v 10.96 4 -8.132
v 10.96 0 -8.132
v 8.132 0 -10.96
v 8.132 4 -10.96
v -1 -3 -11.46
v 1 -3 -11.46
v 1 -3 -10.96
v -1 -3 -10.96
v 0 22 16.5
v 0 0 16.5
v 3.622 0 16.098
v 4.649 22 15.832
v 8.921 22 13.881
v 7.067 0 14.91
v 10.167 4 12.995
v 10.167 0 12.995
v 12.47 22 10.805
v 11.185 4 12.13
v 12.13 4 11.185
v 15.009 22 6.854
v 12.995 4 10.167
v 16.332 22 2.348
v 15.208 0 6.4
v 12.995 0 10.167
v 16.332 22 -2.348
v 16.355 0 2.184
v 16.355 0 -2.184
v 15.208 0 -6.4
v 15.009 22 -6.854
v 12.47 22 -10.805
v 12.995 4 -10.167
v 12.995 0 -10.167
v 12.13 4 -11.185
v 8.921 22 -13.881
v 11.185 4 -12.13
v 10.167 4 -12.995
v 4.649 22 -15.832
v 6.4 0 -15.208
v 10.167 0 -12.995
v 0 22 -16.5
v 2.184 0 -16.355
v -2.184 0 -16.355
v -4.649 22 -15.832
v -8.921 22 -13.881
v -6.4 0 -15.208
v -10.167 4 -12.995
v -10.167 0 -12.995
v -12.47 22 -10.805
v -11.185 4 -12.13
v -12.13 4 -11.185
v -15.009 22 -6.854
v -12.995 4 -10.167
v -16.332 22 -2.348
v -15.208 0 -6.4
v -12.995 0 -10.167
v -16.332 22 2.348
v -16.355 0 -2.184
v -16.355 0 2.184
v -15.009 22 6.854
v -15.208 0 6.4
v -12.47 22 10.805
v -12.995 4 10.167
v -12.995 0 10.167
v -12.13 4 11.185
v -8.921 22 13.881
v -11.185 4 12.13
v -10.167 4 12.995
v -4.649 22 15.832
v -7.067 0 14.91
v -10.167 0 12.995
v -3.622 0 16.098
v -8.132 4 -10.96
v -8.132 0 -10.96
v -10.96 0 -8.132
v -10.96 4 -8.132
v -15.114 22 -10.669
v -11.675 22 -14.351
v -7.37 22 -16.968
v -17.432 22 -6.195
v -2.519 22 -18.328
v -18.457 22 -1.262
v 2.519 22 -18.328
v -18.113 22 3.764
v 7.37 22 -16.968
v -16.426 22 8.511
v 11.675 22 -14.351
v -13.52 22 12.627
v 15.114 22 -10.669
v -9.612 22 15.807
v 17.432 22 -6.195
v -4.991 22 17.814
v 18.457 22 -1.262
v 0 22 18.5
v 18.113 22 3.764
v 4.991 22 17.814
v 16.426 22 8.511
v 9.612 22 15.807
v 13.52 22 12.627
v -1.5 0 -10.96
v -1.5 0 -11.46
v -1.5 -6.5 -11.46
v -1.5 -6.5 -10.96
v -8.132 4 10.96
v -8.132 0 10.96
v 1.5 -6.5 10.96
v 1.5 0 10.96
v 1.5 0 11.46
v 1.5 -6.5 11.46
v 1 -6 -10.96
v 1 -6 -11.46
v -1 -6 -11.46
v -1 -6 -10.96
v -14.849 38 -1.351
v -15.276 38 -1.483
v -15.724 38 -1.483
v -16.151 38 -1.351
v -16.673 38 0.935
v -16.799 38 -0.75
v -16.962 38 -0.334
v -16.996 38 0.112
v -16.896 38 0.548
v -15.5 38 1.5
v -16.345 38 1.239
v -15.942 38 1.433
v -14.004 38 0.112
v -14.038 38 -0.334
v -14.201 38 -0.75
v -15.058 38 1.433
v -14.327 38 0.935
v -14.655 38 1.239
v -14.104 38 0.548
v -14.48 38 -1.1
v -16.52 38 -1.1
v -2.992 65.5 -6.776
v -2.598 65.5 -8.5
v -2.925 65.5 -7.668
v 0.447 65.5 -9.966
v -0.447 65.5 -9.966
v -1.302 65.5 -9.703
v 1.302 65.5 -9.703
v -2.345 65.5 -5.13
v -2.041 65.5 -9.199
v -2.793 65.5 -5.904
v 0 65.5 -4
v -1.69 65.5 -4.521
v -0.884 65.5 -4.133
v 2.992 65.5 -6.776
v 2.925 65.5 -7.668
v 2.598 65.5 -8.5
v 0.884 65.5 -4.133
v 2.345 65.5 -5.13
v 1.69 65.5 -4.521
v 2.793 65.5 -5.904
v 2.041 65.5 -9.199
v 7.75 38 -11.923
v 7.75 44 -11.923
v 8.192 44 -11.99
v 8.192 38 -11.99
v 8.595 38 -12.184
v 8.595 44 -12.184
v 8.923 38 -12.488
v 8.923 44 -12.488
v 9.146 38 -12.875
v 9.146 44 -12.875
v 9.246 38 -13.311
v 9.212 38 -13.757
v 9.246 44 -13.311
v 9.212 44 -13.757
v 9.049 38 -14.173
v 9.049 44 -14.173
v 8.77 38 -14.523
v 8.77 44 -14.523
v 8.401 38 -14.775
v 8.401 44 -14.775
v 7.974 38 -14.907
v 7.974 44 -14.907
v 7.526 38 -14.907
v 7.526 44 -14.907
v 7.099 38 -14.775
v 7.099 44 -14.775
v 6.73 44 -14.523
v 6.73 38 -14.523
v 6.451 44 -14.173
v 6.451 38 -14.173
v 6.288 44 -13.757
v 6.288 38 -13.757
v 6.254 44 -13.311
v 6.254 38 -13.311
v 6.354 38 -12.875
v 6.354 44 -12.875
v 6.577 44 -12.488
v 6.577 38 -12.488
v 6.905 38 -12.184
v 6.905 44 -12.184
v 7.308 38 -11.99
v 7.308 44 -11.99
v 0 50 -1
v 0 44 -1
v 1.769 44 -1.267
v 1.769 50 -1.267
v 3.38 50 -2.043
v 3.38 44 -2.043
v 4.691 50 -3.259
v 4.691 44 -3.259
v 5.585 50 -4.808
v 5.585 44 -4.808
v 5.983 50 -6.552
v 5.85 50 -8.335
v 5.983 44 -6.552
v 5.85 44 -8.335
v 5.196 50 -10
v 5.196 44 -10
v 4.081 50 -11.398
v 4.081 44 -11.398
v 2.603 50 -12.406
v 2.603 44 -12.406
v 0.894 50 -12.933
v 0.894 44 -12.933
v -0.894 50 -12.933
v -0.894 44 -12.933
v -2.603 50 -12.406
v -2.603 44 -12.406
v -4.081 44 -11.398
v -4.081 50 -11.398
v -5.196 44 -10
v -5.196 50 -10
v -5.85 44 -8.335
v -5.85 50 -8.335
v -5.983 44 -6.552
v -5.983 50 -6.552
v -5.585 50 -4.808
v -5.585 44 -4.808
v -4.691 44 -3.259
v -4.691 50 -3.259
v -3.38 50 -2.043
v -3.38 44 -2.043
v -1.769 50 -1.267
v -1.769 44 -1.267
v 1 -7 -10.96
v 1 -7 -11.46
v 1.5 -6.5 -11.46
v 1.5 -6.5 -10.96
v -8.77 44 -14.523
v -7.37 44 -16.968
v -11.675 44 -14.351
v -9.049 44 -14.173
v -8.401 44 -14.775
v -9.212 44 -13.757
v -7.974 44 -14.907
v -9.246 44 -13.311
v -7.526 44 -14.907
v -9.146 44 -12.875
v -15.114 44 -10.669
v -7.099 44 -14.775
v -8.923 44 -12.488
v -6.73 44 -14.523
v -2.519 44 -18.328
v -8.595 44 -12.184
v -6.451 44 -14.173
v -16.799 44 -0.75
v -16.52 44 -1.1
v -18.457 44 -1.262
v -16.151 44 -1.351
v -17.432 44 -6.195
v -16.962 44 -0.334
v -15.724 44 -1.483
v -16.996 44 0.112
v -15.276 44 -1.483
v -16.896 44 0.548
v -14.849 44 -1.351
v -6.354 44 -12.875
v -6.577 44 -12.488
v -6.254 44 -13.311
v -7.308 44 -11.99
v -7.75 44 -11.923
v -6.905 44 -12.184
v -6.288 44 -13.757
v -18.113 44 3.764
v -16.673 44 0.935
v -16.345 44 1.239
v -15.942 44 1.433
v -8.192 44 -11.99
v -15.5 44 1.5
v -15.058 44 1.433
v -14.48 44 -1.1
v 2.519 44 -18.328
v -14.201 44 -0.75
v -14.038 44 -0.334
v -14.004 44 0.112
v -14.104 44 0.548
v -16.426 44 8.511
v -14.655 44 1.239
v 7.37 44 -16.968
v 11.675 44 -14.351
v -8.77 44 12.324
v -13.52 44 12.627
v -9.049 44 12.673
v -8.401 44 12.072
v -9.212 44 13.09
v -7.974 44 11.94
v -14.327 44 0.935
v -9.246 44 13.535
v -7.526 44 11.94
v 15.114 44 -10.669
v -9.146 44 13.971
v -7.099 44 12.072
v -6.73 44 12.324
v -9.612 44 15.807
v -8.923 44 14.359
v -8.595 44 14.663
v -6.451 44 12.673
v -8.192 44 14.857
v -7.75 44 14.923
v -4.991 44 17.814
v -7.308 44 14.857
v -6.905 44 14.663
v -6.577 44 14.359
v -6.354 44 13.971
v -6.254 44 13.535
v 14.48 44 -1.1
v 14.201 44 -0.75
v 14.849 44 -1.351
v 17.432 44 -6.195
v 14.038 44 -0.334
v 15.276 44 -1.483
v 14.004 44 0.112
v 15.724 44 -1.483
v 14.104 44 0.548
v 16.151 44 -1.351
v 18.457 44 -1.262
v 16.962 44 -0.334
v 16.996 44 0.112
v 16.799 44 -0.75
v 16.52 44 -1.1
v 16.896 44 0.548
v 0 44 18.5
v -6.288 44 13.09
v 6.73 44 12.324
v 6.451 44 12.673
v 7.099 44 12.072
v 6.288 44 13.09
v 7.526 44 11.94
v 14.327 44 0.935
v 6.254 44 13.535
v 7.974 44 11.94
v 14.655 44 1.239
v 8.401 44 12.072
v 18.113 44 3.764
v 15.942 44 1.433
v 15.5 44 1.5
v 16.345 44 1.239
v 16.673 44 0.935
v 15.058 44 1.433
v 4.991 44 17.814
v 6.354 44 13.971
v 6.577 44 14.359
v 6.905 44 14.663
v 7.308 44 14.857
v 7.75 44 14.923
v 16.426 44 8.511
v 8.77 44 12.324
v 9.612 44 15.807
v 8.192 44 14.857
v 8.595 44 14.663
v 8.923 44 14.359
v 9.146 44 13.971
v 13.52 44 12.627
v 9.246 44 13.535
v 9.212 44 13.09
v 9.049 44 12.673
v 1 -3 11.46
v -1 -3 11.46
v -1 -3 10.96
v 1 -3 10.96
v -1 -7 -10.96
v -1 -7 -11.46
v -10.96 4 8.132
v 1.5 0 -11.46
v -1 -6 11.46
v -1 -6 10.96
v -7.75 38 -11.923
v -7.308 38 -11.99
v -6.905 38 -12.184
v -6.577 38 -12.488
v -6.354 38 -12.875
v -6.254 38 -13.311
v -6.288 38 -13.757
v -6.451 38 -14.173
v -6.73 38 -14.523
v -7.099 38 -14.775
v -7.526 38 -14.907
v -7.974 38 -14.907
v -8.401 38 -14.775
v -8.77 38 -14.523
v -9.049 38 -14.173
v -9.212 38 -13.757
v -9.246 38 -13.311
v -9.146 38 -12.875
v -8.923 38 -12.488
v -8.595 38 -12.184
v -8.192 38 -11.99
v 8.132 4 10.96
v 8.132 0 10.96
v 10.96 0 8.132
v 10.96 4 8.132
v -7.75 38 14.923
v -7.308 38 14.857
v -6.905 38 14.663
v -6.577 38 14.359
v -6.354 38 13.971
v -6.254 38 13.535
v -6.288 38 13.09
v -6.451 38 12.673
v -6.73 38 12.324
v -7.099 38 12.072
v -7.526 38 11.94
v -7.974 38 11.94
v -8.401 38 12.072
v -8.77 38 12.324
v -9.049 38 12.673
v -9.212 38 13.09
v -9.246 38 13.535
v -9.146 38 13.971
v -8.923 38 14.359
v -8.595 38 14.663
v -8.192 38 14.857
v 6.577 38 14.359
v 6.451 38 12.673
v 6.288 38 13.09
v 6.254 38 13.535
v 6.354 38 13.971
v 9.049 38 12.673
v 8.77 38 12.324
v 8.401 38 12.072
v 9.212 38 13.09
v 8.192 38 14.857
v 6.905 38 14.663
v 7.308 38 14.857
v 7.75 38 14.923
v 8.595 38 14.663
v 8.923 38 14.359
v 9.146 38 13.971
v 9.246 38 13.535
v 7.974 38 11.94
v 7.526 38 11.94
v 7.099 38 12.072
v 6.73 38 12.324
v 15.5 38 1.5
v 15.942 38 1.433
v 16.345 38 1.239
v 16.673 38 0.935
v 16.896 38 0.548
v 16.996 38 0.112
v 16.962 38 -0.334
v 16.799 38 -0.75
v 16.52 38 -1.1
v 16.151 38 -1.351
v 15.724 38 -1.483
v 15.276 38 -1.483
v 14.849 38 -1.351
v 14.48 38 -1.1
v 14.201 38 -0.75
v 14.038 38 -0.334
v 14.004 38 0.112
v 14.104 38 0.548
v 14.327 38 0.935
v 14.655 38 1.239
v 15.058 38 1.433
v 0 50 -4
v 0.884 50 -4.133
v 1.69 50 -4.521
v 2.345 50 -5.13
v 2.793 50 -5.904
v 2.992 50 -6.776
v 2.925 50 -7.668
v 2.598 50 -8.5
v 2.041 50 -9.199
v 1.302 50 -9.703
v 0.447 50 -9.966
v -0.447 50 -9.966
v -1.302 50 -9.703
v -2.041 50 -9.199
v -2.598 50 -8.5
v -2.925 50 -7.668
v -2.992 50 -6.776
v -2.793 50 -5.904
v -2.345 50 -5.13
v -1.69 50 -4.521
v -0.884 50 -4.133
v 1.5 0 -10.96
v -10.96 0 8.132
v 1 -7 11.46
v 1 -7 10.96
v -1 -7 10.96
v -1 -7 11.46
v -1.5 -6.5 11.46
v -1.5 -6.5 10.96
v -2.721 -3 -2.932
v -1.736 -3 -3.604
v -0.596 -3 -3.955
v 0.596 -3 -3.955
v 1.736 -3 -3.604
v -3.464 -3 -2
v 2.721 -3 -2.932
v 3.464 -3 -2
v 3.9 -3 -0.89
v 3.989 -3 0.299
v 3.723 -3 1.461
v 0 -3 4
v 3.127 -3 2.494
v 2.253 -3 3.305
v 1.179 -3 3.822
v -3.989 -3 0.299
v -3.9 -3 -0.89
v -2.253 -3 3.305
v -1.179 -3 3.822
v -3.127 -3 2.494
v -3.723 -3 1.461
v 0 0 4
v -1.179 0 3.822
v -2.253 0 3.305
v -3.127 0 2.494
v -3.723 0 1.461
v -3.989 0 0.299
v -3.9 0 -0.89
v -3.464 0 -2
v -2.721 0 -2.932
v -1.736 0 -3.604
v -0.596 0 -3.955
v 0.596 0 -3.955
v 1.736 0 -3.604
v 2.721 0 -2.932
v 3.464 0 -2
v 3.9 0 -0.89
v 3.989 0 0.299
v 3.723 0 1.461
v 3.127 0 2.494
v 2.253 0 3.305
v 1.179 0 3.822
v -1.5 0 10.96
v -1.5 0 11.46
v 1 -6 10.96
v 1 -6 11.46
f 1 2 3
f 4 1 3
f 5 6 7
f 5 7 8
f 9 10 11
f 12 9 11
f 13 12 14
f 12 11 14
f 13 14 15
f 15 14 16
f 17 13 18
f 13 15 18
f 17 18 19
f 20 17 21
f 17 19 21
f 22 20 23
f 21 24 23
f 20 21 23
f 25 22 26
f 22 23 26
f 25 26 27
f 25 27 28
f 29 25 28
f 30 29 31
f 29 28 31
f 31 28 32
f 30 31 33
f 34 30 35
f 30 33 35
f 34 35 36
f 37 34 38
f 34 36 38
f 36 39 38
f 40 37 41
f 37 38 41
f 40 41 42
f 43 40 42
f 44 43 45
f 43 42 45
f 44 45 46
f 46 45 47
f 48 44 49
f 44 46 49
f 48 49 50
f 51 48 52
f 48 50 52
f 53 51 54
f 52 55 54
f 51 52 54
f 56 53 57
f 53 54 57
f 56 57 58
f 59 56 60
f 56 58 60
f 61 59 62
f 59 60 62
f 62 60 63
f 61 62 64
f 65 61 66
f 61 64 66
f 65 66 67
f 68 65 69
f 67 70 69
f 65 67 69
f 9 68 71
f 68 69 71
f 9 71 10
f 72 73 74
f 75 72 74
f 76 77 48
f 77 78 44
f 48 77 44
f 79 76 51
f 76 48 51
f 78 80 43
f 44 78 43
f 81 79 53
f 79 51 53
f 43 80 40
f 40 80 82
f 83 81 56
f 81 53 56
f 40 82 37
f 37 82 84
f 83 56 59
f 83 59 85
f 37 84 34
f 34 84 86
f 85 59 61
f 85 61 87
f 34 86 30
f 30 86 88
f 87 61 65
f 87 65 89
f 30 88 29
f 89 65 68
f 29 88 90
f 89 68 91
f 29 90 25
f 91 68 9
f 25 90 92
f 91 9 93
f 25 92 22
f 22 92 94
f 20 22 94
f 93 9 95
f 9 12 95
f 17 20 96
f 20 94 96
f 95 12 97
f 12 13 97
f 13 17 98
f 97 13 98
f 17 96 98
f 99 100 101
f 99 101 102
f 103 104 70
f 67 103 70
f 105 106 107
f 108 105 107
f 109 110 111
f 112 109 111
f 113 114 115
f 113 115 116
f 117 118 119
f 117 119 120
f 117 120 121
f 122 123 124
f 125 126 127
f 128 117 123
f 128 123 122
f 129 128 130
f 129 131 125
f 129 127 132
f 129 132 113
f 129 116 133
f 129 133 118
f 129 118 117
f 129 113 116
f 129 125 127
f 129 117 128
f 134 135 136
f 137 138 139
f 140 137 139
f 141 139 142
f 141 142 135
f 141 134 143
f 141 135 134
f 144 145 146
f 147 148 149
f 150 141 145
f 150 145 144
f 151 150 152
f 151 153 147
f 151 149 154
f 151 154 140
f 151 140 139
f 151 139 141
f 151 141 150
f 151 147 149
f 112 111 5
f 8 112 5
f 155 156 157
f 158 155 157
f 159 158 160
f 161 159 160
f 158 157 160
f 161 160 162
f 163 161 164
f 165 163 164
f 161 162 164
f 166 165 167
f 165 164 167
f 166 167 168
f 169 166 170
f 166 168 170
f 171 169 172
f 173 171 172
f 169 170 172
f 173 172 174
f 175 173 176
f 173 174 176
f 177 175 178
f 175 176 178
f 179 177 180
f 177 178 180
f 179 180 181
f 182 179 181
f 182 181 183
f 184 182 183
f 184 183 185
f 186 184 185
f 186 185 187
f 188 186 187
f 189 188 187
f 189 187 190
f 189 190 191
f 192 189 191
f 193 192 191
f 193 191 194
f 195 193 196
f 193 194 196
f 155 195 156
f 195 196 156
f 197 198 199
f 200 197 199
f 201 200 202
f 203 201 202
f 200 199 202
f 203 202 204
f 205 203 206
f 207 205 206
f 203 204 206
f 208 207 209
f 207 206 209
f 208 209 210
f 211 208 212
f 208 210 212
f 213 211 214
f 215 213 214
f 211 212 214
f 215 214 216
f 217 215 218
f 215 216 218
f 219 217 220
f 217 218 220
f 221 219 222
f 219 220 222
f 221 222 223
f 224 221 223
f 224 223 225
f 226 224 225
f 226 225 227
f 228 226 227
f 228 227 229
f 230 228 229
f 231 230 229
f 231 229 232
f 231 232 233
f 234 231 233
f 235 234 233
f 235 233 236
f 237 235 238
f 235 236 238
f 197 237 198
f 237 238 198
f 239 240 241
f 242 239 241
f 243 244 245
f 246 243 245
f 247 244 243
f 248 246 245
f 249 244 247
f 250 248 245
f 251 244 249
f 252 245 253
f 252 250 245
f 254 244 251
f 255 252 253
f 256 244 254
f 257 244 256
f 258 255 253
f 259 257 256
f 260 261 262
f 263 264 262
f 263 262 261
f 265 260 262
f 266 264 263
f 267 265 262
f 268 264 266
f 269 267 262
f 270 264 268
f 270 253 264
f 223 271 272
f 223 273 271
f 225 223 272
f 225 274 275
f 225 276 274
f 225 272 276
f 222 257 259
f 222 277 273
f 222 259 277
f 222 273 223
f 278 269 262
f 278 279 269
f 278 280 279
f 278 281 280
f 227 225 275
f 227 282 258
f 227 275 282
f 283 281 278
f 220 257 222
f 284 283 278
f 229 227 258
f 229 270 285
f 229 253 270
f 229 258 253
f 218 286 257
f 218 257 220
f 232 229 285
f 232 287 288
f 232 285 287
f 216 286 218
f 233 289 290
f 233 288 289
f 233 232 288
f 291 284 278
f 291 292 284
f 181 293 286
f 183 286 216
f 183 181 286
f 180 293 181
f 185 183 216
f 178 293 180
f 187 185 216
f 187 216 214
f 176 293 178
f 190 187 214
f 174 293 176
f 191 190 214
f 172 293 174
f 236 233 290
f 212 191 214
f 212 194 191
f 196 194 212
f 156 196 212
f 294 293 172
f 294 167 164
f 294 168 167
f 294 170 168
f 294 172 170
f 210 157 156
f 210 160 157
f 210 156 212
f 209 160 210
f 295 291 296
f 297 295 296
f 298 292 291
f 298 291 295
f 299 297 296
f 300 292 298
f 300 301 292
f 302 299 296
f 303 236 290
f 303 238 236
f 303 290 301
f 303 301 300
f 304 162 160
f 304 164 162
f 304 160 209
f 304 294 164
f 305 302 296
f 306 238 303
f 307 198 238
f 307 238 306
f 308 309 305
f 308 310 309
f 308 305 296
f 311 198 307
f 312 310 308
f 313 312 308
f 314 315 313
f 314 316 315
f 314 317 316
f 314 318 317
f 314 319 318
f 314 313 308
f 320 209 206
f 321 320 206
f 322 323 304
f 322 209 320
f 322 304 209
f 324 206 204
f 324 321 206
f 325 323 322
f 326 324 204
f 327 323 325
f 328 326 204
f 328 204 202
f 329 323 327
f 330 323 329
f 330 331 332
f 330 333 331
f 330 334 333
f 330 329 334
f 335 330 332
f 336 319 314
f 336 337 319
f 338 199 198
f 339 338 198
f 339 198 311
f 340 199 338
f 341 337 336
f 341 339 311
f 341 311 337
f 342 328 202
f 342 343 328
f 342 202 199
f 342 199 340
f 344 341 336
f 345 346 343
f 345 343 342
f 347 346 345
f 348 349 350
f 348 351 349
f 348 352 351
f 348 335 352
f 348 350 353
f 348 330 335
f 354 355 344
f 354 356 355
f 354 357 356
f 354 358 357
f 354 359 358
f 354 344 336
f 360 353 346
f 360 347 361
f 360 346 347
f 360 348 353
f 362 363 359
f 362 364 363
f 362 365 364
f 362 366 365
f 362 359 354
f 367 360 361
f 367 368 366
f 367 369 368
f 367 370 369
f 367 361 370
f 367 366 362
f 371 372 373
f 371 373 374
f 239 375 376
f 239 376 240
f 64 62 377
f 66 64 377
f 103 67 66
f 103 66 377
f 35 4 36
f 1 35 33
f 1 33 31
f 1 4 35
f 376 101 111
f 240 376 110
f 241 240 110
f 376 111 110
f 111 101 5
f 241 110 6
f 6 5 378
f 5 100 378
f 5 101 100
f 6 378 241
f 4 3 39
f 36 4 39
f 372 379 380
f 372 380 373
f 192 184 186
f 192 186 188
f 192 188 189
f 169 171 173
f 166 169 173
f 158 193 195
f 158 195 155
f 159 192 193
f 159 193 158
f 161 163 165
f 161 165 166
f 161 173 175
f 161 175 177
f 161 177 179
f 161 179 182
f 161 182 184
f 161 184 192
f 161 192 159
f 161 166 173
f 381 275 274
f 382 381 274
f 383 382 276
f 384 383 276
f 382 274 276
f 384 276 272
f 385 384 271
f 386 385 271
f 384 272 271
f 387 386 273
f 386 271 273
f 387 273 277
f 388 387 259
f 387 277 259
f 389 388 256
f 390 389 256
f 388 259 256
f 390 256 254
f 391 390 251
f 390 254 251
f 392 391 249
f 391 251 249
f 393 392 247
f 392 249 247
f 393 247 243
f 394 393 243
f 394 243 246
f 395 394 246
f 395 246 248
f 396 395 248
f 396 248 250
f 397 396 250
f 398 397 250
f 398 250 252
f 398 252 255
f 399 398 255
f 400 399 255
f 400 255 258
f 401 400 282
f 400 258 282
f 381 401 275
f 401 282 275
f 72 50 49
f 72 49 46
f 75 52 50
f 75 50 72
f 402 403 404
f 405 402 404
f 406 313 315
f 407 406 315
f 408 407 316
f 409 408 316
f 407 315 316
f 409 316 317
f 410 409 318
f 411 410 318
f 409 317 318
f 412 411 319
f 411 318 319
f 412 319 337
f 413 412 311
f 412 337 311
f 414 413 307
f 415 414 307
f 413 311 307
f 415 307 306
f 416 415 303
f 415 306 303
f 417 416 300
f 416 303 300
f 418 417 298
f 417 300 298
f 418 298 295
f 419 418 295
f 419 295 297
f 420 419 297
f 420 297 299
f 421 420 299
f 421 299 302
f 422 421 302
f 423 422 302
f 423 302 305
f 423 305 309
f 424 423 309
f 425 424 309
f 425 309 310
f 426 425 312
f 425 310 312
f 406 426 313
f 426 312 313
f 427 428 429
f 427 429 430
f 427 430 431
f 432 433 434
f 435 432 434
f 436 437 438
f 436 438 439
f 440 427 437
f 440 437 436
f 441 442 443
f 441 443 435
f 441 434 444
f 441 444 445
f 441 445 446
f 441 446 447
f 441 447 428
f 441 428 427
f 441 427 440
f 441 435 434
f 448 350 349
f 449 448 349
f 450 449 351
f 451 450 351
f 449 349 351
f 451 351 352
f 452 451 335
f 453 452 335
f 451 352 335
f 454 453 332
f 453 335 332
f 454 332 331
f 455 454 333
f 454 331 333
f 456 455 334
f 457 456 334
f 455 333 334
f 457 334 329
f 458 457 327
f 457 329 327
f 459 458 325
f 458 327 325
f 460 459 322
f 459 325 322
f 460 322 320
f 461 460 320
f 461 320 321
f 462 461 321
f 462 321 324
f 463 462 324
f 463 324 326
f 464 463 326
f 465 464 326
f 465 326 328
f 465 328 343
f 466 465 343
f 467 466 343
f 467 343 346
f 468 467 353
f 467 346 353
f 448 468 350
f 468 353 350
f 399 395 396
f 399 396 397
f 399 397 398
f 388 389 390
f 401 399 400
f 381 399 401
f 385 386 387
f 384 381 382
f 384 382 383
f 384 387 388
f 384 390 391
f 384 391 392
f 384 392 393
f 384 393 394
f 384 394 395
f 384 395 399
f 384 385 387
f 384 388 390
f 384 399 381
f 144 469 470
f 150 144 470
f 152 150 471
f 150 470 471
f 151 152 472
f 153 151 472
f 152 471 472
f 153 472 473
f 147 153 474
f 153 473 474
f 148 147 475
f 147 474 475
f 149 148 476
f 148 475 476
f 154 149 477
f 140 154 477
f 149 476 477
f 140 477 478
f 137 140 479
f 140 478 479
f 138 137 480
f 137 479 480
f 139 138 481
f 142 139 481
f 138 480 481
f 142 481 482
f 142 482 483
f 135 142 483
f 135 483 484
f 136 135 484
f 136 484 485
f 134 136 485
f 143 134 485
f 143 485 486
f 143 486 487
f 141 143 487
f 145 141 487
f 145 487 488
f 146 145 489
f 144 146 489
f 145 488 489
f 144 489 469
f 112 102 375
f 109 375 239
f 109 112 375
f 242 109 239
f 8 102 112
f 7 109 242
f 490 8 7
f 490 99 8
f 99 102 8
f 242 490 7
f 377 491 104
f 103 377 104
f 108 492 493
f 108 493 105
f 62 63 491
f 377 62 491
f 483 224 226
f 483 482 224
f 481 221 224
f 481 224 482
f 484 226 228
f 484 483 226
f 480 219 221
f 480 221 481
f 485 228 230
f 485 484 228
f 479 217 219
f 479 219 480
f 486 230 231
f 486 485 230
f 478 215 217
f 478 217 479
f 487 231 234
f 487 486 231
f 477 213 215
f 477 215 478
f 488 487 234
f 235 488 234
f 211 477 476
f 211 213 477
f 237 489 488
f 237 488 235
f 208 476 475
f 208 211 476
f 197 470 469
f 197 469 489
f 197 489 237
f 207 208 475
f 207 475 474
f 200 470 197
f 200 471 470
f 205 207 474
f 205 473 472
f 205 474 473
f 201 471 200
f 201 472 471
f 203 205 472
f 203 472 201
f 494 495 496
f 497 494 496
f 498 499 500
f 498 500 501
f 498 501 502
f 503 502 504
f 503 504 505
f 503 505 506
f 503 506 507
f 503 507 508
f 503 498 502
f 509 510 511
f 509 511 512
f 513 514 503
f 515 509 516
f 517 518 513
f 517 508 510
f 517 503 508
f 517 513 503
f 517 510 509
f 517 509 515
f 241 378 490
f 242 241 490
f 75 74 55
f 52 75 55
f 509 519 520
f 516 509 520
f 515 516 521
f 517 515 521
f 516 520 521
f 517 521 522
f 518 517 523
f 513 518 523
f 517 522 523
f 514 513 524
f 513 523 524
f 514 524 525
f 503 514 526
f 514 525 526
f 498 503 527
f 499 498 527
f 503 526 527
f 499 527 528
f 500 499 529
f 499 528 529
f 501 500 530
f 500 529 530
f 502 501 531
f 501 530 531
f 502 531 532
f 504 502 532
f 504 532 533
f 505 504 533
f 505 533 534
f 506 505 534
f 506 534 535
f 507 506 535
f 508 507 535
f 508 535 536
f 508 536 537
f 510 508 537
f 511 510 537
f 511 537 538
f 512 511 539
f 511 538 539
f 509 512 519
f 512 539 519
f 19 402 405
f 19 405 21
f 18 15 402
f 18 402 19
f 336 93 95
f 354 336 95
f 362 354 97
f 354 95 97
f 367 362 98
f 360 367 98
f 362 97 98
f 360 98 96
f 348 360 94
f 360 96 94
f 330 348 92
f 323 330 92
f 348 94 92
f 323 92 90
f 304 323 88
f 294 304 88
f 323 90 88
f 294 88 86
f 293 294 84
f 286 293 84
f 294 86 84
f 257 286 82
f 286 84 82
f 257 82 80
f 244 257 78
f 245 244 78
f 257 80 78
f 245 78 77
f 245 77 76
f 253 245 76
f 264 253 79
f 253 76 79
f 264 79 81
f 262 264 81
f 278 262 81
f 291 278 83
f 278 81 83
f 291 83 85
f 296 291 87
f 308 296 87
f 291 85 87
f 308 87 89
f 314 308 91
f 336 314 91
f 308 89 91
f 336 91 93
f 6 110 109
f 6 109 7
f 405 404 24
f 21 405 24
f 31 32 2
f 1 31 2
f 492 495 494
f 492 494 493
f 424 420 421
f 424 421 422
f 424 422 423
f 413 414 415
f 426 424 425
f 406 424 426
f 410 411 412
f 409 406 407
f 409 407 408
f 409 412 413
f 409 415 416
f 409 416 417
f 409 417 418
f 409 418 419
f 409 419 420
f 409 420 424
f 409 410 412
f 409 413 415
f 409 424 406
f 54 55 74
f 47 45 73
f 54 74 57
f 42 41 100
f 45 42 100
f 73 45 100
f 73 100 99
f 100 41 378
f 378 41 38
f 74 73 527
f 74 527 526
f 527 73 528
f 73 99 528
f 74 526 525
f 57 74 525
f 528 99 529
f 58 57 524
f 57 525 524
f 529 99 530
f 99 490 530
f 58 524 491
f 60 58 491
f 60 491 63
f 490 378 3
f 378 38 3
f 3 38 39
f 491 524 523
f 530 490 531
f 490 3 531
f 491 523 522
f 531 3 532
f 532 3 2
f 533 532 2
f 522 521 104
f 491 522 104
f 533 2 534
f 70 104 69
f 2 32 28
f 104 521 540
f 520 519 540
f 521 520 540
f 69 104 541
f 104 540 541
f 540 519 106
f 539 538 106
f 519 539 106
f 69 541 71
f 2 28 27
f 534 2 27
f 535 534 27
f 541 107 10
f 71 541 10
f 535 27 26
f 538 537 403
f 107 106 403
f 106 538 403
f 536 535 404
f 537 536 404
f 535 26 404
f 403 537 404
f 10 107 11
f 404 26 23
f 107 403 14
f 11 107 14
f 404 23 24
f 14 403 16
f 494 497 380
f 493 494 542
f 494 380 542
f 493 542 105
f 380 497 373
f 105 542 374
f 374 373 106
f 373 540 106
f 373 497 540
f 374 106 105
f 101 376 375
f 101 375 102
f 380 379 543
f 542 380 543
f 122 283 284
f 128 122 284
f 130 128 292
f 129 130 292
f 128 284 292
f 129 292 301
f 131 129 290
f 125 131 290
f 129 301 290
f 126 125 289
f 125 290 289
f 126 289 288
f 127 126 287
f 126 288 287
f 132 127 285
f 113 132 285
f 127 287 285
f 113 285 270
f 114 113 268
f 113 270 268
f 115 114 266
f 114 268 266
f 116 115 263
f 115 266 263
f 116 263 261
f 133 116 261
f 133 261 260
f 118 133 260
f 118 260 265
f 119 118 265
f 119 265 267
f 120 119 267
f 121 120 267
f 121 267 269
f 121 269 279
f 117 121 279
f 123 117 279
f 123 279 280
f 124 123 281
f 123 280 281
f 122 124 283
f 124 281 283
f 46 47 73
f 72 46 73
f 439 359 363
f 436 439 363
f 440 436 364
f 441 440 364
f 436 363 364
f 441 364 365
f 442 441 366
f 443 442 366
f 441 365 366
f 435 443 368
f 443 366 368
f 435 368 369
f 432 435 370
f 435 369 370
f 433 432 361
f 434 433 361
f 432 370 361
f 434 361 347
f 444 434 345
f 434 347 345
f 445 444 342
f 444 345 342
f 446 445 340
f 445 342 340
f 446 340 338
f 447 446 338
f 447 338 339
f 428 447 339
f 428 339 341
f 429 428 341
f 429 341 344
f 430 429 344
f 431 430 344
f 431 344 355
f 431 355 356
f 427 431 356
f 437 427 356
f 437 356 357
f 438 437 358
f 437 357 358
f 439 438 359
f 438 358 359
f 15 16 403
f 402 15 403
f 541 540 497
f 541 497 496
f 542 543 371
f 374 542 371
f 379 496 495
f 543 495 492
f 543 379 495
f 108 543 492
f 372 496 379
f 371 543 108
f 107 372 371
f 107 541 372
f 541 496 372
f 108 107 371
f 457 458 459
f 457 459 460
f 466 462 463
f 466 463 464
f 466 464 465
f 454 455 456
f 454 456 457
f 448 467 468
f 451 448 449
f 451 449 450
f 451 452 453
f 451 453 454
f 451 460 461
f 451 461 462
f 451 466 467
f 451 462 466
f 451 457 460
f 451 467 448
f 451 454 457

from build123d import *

# Parameters (mm, degrees)
SKETCH_1_R          = 16.5
EXTRUDE_1_DEPTH     = 22
SKETCH_2_R          = 18.5
EXTRUDE_2_DEPTH     = 22
SKETCH_3_R          = 6
EXTRUDE_3_DEPTH     = 6
SKETCH_4_R          = 3
EXTRUDE_7_DEPTH     = 15.5
CUT_EXTRUDE_1_DEPTH = 4
SKETCH_6_R          = 4
EXTRUDE_5_DEPTH     = 3
SKETCH_7_R          = 1.5
CUT_EXTRUDE_2_DEPTH = 6
SKETCH_8_W          = 3
SKETCH_8_H          = 0.5
EXTRUDE_6_DEPTH     = 7
SKETCH_9_W          = 2
SKETCH_9_H          = 3
CUT_EXTRUDE_3_DEPTH = 1
SKETCH_10_W         = 2
SKETCH_10_H         = 3
CUT_EXTRUDE_4_DEPTH = 1


with BuildPart() as part:
    # 草图1 → 凸台-拉伸1 (new body)
    with BuildSketch(Plane(origin=(0, 0, 0), x_dir=(1, 0, 0), z_dir=(0, 1, 0))):
        with Locations(Location((0, 0, 0), (0, 0, 270))):
            Circle(SKETCH_1_R)
    extrude(amount=EXTRUDE_1_DEPTH)

    # 草图2 → 凸台-拉伸2 (add)
    with BuildSketch(Plane(origin=(0, 22, 0), x_dir=(1, 0, 0), z_dir=(0, 1, 0))):
        with Locations(Location((0, 0, 0), (0, 0, 270))):
            Circle(SKETCH_2_R)
    extrude(amount=EXTRUDE_2_DEPTH)

    # 草图3 → 凸台-拉伸3 (add)
    with BuildSketch(Plane(origin=(0, 44, 0), x_dir=(1, 0, 0), z_dir=(0, 1, 0))):
        with Locations(Location((0, 7, 0), (0, 0, 270))):
            Circle(SKETCH_3_R)
    extrude(amount=EXTRUDE_3_DEPTH)

    # 草图4 → 凸台-拉伸7 (add)
    with BuildSketch(Plane(origin=(0, 50, 0), x_dir=(1, 0, 0), z_dir=(0, 1, 0))):
        with Locations(Location((0, 7, 0), (0, 0, 270))):
            Circle(SKETCH_4_R)
    extrude(amount=EXTRUDE_7_DEPTH)

    # 草图5 → 切除-拉伸1 (cut)
    with BuildSketch(Plane.XZ):
        with BuildLine():
            Line((-10.960155108, 8.131727984), (-8.131727984, 10.960155108))
            Line((-8.131727984, 10.960155108), (-10.16702126, 12.995448384))
            ThreePointArc((-10.16702126, 12.995448384), (-11.66726189, 11.66726189), (-12.995448384, 10.16702126))
            Line((-12.995448384, 10.16702126), (-10.960155108, 8.131727984))
        make_face()
        with BuildLine():
            Line((8.131727984, 10.960155108), (10.960155108, 8.131727984))
            Line((10.960155108, 8.131727984), (12.995448384, 10.16702126))
            ThreePointArc((12.995448384, 10.16702126), (11.66726189, 11.66726189), (10.16702126, 12.995448384))
            Line((10.16702126, 12.995448384), (8.131727984, 10.960155108))
        make_face()
        with BuildLine():
            Line((10.960155108, -8.131727984), (8.131727984, -10.960155108))
            Line((8.131727984, -10.960155108), (10.16702126, -12.995448384))
            ThreePointArc((10.16702126, -12.995448384), (11.66726189, -11.66726189), (12.995448384, -10.16702126))
            Line((12.995448384, -10.16702126), (10.960155108, -8.131727984))
        make_face()
        with BuildLine():
            Line((-8.131727984, -10.960155108), (-10.960155108, -8.131727984))
            Line((-10.960155108, -8.131727984), (-12.995448384, -10.16702126))
            ThreePointArc((-12.995448384, -10.16702126), (-11.66726189, -11.66726189), (-10.16702126, -12.995448384))
            Line((-10.16702126, -12.995448384), (-8.131727984, -10.960155108))
        make_face()
    extrude(amount=-CUT_EXTRUDE_1_DEPTH, mode=Mode.SUBTRACT)

    # 草图6 → 凸台-拉伸5 (add)
    with BuildSketch(Plane.XZ):
        with Locations(Location((0, 0, 0), (0, 0, 90))):
            Circle(SKETCH_6_R)
    extrude(amount=EXTRUDE_5_DEPTH)

    # 草图7 → 切除-拉伸2 (cut)
    with BuildSketch(Plane(origin=(0, 44, 0), x_dir=(1, 0, 0), z_dir=(0, 1, 0))):
        with Locations(Location((15.5, 0, 0), (0, 0, 270))):
            Circle(SKETCH_7_R)
        with Locations(Location((7.75, -13.423393759, 0), (0, 0, 270))):
            Circle(SKETCH_7_R)
        with Locations(Location((-7.75, -13.423393759, 0), (0, 0, 270))):
            Circle(SKETCH_7_R)
        with Locations(Location((-15.5, 0, 0), (0, 0, 270))):
            Circle(SKETCH_7_R)
        with Locations(Location((-7.75, 13.423393759, 0), (0, 0, 270))):
            Circle(SKETCH_7_R)
        with Locations(Location((7.75, 13.423393759, 0), (0, 0, 270))):
            Circle(SKETCH_7_R)
    extrude(amount=-CUT_EXTRUDE_2_DEPTH, mode=Mode.SUBTRACT)

    # 草图8 → 凸台-拉伸6 (add)
    with BuildSketch(Plane.XZ):
        with Locations((0, 11.210155108)):
            Rectangle(SKETCH_8_W, SKETCH_8_H)
        with Locations((0, -11.210155108)):
            Rectangle(SKETCH_8_W, SKETCH_8_H)
    extrude(amount=EXTRUDE_6_DEPTH)

    # 草图9 → 切除-拉伸3 (cut)
    with BuildSketch(Plane.XY.offset(11.460155108)):
        Polygon((1.5, -7), (1, -7), (1.5, -6.5), align=None)
        Polygon((-1.5, -7), (-1, -7), (-1.5, -6.5), align=None)
        with Locations((0, -4.5)):
            Rectangle(SKETCH_9_W, SKETCH_9_H)
    extrude(amount=-CUT_EXTRUDE_3_DEPTH, mode=Mode.SUBTRACT)

    # 草图10 → 切除-拉伸4 (cut)
    with BuildSketch(Plane(origin=(0, 0, -11.460155108), x_dir=(-1, 0, 0), z_dir=(0, 0, -1))):
        Polygon((1.5, -7), (1, -7), (1.5, -6.5), align=None)
        Polygon((-1.5, -7), (-1, -7), (-1.5, -6.5), align=None)
        with Locations((0, -4.5)):
            Rectangle(SKETCH_10_W, SKETCH_10_H)
    extrude(amount=-CUT_EXTRUDE_4_DEPTH, mode=Mode.SUBTRACT)


solid = part.part
